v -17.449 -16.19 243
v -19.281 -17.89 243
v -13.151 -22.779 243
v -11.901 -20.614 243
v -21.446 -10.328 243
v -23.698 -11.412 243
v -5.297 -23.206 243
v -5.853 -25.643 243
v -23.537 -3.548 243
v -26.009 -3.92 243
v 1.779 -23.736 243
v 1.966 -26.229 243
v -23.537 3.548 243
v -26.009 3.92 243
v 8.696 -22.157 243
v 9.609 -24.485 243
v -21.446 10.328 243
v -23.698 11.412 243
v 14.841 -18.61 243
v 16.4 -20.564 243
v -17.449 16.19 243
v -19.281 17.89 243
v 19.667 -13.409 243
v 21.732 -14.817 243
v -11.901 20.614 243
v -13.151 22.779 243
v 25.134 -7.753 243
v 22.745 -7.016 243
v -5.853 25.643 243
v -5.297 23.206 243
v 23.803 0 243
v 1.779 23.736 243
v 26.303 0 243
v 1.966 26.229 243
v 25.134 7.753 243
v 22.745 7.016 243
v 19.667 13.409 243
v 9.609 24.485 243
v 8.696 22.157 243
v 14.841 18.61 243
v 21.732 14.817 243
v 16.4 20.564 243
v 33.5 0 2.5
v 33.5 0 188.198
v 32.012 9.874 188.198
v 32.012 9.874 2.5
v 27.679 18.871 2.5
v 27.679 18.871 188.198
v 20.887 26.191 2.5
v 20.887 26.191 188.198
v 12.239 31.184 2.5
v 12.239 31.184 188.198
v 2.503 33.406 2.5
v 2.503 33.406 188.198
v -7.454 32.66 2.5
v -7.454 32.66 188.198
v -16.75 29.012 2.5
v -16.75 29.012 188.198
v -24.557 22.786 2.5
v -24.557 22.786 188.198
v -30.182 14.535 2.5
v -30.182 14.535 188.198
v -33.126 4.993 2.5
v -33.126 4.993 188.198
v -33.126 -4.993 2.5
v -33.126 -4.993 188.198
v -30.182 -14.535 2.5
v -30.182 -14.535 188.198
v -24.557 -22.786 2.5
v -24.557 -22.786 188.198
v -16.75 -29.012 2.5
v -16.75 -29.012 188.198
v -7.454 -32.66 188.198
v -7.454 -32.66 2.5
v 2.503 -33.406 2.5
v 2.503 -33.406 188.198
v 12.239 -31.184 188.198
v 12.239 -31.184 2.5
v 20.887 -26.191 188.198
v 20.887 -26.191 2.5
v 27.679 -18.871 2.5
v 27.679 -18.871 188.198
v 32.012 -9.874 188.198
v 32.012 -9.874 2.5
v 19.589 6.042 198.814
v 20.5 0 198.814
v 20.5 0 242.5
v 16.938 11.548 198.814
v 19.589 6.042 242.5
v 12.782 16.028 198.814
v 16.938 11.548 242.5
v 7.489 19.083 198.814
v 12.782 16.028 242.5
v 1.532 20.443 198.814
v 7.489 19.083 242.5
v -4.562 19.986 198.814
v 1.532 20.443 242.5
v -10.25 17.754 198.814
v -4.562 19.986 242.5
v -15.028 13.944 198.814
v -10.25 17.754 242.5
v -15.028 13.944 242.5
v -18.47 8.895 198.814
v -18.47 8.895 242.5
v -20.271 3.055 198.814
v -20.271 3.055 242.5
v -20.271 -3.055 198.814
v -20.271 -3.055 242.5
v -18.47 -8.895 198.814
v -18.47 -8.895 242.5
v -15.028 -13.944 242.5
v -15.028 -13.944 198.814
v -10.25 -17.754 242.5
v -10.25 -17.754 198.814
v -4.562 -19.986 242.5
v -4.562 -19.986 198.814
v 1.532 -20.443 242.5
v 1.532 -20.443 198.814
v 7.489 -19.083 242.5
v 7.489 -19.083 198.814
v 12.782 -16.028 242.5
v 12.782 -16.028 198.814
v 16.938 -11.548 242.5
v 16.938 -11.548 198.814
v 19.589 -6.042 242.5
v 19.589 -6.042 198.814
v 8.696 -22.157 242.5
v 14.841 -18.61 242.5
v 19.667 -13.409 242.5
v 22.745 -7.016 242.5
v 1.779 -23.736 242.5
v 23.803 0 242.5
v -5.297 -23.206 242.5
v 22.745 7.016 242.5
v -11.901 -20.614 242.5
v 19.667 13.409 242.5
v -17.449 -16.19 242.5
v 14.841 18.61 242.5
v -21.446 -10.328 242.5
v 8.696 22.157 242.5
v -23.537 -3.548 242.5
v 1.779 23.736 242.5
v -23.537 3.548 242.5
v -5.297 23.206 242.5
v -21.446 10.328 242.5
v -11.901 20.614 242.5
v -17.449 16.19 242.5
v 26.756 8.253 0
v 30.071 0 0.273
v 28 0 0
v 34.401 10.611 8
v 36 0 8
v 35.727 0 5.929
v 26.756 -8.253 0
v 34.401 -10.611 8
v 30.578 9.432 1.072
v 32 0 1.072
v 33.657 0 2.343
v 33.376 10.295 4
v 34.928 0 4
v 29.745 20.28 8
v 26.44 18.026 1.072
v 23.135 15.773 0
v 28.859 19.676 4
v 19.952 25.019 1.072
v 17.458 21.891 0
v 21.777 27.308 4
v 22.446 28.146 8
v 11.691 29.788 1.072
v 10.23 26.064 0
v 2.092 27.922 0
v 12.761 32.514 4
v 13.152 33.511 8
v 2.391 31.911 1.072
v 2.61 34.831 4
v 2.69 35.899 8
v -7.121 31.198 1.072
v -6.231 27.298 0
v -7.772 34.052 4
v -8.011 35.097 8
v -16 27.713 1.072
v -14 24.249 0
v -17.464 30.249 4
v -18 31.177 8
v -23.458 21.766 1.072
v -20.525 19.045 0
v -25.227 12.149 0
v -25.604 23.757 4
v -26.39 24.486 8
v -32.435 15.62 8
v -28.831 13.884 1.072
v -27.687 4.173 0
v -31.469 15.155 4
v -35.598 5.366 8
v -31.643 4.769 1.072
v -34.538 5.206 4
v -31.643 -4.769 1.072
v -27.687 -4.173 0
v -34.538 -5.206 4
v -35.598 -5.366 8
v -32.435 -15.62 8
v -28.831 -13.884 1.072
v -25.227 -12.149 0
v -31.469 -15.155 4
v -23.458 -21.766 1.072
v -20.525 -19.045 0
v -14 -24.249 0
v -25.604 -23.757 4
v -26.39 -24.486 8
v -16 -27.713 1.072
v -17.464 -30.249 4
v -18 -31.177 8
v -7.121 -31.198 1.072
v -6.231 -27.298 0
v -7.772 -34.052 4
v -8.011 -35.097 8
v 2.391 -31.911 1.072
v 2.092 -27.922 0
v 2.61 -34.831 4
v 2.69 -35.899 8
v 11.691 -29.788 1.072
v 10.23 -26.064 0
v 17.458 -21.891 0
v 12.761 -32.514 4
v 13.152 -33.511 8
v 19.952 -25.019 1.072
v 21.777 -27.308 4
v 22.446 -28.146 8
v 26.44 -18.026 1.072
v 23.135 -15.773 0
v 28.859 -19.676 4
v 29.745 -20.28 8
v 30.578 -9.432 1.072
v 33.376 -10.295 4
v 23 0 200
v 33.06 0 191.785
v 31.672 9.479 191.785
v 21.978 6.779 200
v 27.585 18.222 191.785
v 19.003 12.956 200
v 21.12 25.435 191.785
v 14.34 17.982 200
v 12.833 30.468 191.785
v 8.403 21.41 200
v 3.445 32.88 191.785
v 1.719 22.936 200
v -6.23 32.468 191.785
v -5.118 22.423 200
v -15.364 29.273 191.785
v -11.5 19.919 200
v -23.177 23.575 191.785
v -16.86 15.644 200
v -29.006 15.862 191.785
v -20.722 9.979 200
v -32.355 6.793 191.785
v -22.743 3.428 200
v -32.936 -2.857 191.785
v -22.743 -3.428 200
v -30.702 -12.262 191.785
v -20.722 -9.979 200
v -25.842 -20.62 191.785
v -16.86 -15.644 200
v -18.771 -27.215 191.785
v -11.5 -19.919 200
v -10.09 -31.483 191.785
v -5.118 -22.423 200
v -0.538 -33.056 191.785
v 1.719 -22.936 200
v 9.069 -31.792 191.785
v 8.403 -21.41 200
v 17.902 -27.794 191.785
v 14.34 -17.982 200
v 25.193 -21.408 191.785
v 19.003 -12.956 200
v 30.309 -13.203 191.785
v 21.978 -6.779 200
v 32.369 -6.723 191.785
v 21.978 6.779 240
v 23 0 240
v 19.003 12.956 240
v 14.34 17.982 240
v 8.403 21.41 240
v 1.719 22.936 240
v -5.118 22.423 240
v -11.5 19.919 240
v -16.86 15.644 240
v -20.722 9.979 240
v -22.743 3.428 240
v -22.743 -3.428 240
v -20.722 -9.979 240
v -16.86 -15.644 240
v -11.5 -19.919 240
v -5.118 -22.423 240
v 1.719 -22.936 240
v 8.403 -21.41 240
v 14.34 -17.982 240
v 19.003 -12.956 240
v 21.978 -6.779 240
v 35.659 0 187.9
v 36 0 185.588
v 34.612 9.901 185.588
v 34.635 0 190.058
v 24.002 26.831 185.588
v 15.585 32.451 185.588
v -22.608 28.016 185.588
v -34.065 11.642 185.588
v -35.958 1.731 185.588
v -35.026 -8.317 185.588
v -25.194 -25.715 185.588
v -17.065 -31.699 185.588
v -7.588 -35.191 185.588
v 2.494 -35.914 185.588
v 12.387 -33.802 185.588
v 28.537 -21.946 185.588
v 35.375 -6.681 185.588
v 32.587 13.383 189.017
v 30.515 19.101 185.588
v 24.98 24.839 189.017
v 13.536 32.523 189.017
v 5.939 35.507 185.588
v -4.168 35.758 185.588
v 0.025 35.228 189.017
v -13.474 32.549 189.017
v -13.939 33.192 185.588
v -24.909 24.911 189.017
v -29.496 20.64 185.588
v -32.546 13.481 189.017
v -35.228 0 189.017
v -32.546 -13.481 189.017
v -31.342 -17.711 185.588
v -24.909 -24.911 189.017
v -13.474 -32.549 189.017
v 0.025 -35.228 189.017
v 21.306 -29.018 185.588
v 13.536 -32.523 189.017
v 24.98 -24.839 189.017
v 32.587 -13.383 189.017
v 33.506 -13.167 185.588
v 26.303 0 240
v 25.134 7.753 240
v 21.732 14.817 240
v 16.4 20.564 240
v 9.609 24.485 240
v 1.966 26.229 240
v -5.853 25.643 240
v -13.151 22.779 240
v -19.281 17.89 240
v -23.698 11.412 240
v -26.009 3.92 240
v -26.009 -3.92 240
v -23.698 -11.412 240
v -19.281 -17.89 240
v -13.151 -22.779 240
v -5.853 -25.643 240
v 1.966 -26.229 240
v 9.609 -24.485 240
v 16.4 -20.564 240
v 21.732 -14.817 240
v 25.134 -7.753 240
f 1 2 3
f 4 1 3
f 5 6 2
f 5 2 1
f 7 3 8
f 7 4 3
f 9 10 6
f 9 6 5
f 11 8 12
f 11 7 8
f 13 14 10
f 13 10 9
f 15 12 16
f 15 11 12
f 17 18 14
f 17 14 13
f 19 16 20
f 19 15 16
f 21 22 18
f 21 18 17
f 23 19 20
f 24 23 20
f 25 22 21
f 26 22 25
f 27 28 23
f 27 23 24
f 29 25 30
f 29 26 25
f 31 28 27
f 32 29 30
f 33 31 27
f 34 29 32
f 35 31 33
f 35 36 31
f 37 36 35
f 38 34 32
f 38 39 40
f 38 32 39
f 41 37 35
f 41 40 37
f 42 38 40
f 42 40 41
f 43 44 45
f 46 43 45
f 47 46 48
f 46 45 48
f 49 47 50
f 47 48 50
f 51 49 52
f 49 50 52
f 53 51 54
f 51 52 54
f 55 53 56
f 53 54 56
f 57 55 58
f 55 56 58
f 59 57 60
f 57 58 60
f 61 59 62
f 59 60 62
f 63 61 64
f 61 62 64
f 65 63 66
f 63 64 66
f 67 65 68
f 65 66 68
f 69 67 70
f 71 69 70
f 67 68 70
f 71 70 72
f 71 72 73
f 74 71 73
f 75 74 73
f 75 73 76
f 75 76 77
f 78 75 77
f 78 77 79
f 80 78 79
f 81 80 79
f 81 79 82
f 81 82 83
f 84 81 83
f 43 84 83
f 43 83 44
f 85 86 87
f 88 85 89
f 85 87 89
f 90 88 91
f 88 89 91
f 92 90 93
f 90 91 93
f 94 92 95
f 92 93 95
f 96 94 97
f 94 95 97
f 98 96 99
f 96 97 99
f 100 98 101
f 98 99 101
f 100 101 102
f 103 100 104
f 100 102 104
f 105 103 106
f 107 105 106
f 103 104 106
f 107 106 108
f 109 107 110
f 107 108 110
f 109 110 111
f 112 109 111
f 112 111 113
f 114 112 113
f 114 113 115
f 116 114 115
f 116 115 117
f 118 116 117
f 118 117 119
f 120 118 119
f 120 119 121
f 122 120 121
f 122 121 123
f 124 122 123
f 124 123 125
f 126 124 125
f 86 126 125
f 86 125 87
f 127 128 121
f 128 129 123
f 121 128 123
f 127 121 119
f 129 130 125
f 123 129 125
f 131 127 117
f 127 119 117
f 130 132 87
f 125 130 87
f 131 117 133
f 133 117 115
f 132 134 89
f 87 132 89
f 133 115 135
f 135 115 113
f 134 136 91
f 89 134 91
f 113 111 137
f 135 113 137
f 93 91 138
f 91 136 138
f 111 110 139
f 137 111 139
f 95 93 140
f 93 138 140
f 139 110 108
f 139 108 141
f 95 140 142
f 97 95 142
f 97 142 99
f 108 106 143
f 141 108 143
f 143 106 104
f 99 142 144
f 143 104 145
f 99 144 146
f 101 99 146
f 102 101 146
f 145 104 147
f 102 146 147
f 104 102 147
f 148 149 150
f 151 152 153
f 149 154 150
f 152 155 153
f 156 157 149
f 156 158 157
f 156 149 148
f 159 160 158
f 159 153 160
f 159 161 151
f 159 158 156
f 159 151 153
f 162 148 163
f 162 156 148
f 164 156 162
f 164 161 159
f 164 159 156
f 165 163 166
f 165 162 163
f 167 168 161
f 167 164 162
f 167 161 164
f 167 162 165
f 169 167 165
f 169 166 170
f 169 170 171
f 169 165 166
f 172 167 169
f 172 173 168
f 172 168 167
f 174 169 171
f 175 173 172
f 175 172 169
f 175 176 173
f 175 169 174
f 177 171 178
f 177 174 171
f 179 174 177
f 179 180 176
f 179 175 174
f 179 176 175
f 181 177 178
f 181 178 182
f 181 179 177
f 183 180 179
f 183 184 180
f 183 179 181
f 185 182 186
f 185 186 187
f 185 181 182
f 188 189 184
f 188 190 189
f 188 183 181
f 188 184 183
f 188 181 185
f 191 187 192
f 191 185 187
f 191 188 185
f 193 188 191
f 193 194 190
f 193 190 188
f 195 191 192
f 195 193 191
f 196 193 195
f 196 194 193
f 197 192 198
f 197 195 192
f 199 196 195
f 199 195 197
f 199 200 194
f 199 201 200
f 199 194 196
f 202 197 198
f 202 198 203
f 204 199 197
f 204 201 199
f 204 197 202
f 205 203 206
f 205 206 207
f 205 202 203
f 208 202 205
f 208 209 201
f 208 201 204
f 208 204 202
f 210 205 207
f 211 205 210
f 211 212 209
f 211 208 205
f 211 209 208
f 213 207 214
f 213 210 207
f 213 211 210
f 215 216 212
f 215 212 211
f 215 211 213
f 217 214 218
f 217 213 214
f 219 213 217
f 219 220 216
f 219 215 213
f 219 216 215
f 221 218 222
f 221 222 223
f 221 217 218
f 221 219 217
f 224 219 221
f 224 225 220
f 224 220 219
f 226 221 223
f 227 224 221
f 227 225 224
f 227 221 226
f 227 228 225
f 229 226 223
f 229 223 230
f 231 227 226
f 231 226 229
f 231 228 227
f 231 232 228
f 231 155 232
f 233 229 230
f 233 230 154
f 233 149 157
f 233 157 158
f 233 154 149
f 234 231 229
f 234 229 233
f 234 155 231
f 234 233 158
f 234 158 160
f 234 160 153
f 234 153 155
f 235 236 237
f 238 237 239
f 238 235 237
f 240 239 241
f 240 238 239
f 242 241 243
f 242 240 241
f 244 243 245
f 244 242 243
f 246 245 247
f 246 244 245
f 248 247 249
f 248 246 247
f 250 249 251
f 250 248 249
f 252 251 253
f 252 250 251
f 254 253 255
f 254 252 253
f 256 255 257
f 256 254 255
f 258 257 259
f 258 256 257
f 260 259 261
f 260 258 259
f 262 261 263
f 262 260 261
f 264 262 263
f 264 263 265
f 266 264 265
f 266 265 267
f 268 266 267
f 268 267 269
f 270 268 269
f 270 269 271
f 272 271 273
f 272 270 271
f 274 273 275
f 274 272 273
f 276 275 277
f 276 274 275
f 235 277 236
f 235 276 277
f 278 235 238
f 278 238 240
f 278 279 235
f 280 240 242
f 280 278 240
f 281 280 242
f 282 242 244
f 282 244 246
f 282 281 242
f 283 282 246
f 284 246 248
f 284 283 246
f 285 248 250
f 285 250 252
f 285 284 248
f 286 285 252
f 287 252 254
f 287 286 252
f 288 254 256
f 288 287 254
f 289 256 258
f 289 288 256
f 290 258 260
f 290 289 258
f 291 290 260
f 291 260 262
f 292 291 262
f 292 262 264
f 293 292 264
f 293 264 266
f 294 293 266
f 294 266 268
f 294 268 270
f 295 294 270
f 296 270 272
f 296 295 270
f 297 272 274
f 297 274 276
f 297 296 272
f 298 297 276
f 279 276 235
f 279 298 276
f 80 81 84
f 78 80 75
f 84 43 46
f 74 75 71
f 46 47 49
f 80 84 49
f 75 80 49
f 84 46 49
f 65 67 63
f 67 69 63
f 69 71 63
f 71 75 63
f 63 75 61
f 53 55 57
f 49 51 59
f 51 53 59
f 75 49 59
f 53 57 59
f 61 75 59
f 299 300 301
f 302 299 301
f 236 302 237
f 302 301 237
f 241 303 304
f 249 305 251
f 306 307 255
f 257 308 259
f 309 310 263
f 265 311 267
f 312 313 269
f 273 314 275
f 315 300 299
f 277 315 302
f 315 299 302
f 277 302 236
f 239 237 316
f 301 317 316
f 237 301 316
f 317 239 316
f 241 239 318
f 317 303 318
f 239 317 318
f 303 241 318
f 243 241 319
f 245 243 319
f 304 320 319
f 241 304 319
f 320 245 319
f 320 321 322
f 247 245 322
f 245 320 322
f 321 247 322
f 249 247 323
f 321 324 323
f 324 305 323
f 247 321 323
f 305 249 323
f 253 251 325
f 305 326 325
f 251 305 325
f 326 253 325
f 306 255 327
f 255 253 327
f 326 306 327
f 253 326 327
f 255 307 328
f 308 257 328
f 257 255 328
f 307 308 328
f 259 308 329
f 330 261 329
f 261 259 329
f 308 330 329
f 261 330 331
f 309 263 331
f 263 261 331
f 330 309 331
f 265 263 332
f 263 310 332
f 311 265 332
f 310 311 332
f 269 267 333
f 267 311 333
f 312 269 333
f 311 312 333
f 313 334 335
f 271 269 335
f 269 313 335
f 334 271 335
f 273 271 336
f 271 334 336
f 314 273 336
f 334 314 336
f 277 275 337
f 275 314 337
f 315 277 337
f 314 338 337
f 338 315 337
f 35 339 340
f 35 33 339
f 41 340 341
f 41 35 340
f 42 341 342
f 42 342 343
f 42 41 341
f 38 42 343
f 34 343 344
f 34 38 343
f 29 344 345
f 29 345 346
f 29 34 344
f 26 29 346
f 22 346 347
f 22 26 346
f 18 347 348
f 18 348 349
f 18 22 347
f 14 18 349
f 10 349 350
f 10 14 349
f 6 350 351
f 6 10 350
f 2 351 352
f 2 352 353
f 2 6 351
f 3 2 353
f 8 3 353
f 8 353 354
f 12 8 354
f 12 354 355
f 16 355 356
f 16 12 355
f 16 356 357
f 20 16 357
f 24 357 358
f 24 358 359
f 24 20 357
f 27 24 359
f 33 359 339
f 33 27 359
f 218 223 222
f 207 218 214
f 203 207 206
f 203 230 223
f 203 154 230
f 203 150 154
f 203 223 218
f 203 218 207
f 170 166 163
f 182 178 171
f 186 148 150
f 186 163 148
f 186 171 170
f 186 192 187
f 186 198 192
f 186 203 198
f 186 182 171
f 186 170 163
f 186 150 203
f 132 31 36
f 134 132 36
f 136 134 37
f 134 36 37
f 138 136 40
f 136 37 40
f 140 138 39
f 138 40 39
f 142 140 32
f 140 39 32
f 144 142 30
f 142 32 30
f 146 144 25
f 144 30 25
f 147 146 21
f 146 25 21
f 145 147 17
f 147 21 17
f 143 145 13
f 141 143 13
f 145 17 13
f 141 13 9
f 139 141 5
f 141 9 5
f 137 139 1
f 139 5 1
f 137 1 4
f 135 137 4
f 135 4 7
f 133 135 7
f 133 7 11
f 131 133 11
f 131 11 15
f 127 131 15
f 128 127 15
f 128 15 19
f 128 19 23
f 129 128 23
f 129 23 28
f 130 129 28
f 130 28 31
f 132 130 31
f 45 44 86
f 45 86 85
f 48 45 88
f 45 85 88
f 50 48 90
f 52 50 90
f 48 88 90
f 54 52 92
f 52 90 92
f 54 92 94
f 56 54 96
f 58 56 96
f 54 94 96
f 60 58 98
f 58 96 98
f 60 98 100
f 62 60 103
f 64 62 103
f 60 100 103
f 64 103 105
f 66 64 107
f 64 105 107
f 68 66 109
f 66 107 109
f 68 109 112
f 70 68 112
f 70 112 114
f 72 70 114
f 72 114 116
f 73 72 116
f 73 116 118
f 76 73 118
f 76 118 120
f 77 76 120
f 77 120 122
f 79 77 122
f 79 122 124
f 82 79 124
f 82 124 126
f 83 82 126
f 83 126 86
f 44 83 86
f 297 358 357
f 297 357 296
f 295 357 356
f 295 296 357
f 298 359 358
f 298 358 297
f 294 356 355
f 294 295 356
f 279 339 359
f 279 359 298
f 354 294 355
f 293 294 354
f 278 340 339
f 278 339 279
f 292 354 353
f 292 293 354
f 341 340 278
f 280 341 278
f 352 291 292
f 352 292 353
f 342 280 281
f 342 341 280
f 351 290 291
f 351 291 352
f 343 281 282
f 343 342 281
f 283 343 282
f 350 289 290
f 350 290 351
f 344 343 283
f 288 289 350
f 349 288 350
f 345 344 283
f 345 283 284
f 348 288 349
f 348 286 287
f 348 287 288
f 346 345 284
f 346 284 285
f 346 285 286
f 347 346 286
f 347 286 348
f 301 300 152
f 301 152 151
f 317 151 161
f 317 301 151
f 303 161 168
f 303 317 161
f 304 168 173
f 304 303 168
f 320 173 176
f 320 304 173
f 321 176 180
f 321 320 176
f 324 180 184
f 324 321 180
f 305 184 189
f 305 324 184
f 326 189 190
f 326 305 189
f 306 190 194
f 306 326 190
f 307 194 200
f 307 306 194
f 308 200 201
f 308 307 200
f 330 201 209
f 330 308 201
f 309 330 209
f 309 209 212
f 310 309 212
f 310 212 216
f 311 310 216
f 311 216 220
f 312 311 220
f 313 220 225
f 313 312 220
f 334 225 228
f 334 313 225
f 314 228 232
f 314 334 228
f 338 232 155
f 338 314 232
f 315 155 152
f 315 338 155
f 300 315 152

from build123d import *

# Parameters (mm, degrees)
F2_T = -2.5
F3_R = 8


with BuildPart() as f1:
    # F0 (on Front) → F1 (revolve)
    with BuildSketch(Plane.XZ):
        Polygon((0, 243), (0, 0), (36, 0), (36, 189.3837451935), (23, 200), (23, 240), (26.3027578132, 240), (26.3027578132, 243), align=None)
    revolve(axis=Axis((0, 0, 121.5), (0, 0, 1)))

    # F2
    f2_openings = [f1.faces().sort_by_distance(p)[0] for p in [
        (0, 0, 243),
    ]]
    offset(amount=F2_T, openings=f2_openings, kind=Kind.INTERSECTION)

    # F3
    f3_edges = [f1.edges().sort_by_distance(p)[0] for p in [
        (-36, 0, 0),
        (-36, 0, 189.383745),
    ]]
    fillet(f3_edges, radius=F3_R)


solid = f1.part
